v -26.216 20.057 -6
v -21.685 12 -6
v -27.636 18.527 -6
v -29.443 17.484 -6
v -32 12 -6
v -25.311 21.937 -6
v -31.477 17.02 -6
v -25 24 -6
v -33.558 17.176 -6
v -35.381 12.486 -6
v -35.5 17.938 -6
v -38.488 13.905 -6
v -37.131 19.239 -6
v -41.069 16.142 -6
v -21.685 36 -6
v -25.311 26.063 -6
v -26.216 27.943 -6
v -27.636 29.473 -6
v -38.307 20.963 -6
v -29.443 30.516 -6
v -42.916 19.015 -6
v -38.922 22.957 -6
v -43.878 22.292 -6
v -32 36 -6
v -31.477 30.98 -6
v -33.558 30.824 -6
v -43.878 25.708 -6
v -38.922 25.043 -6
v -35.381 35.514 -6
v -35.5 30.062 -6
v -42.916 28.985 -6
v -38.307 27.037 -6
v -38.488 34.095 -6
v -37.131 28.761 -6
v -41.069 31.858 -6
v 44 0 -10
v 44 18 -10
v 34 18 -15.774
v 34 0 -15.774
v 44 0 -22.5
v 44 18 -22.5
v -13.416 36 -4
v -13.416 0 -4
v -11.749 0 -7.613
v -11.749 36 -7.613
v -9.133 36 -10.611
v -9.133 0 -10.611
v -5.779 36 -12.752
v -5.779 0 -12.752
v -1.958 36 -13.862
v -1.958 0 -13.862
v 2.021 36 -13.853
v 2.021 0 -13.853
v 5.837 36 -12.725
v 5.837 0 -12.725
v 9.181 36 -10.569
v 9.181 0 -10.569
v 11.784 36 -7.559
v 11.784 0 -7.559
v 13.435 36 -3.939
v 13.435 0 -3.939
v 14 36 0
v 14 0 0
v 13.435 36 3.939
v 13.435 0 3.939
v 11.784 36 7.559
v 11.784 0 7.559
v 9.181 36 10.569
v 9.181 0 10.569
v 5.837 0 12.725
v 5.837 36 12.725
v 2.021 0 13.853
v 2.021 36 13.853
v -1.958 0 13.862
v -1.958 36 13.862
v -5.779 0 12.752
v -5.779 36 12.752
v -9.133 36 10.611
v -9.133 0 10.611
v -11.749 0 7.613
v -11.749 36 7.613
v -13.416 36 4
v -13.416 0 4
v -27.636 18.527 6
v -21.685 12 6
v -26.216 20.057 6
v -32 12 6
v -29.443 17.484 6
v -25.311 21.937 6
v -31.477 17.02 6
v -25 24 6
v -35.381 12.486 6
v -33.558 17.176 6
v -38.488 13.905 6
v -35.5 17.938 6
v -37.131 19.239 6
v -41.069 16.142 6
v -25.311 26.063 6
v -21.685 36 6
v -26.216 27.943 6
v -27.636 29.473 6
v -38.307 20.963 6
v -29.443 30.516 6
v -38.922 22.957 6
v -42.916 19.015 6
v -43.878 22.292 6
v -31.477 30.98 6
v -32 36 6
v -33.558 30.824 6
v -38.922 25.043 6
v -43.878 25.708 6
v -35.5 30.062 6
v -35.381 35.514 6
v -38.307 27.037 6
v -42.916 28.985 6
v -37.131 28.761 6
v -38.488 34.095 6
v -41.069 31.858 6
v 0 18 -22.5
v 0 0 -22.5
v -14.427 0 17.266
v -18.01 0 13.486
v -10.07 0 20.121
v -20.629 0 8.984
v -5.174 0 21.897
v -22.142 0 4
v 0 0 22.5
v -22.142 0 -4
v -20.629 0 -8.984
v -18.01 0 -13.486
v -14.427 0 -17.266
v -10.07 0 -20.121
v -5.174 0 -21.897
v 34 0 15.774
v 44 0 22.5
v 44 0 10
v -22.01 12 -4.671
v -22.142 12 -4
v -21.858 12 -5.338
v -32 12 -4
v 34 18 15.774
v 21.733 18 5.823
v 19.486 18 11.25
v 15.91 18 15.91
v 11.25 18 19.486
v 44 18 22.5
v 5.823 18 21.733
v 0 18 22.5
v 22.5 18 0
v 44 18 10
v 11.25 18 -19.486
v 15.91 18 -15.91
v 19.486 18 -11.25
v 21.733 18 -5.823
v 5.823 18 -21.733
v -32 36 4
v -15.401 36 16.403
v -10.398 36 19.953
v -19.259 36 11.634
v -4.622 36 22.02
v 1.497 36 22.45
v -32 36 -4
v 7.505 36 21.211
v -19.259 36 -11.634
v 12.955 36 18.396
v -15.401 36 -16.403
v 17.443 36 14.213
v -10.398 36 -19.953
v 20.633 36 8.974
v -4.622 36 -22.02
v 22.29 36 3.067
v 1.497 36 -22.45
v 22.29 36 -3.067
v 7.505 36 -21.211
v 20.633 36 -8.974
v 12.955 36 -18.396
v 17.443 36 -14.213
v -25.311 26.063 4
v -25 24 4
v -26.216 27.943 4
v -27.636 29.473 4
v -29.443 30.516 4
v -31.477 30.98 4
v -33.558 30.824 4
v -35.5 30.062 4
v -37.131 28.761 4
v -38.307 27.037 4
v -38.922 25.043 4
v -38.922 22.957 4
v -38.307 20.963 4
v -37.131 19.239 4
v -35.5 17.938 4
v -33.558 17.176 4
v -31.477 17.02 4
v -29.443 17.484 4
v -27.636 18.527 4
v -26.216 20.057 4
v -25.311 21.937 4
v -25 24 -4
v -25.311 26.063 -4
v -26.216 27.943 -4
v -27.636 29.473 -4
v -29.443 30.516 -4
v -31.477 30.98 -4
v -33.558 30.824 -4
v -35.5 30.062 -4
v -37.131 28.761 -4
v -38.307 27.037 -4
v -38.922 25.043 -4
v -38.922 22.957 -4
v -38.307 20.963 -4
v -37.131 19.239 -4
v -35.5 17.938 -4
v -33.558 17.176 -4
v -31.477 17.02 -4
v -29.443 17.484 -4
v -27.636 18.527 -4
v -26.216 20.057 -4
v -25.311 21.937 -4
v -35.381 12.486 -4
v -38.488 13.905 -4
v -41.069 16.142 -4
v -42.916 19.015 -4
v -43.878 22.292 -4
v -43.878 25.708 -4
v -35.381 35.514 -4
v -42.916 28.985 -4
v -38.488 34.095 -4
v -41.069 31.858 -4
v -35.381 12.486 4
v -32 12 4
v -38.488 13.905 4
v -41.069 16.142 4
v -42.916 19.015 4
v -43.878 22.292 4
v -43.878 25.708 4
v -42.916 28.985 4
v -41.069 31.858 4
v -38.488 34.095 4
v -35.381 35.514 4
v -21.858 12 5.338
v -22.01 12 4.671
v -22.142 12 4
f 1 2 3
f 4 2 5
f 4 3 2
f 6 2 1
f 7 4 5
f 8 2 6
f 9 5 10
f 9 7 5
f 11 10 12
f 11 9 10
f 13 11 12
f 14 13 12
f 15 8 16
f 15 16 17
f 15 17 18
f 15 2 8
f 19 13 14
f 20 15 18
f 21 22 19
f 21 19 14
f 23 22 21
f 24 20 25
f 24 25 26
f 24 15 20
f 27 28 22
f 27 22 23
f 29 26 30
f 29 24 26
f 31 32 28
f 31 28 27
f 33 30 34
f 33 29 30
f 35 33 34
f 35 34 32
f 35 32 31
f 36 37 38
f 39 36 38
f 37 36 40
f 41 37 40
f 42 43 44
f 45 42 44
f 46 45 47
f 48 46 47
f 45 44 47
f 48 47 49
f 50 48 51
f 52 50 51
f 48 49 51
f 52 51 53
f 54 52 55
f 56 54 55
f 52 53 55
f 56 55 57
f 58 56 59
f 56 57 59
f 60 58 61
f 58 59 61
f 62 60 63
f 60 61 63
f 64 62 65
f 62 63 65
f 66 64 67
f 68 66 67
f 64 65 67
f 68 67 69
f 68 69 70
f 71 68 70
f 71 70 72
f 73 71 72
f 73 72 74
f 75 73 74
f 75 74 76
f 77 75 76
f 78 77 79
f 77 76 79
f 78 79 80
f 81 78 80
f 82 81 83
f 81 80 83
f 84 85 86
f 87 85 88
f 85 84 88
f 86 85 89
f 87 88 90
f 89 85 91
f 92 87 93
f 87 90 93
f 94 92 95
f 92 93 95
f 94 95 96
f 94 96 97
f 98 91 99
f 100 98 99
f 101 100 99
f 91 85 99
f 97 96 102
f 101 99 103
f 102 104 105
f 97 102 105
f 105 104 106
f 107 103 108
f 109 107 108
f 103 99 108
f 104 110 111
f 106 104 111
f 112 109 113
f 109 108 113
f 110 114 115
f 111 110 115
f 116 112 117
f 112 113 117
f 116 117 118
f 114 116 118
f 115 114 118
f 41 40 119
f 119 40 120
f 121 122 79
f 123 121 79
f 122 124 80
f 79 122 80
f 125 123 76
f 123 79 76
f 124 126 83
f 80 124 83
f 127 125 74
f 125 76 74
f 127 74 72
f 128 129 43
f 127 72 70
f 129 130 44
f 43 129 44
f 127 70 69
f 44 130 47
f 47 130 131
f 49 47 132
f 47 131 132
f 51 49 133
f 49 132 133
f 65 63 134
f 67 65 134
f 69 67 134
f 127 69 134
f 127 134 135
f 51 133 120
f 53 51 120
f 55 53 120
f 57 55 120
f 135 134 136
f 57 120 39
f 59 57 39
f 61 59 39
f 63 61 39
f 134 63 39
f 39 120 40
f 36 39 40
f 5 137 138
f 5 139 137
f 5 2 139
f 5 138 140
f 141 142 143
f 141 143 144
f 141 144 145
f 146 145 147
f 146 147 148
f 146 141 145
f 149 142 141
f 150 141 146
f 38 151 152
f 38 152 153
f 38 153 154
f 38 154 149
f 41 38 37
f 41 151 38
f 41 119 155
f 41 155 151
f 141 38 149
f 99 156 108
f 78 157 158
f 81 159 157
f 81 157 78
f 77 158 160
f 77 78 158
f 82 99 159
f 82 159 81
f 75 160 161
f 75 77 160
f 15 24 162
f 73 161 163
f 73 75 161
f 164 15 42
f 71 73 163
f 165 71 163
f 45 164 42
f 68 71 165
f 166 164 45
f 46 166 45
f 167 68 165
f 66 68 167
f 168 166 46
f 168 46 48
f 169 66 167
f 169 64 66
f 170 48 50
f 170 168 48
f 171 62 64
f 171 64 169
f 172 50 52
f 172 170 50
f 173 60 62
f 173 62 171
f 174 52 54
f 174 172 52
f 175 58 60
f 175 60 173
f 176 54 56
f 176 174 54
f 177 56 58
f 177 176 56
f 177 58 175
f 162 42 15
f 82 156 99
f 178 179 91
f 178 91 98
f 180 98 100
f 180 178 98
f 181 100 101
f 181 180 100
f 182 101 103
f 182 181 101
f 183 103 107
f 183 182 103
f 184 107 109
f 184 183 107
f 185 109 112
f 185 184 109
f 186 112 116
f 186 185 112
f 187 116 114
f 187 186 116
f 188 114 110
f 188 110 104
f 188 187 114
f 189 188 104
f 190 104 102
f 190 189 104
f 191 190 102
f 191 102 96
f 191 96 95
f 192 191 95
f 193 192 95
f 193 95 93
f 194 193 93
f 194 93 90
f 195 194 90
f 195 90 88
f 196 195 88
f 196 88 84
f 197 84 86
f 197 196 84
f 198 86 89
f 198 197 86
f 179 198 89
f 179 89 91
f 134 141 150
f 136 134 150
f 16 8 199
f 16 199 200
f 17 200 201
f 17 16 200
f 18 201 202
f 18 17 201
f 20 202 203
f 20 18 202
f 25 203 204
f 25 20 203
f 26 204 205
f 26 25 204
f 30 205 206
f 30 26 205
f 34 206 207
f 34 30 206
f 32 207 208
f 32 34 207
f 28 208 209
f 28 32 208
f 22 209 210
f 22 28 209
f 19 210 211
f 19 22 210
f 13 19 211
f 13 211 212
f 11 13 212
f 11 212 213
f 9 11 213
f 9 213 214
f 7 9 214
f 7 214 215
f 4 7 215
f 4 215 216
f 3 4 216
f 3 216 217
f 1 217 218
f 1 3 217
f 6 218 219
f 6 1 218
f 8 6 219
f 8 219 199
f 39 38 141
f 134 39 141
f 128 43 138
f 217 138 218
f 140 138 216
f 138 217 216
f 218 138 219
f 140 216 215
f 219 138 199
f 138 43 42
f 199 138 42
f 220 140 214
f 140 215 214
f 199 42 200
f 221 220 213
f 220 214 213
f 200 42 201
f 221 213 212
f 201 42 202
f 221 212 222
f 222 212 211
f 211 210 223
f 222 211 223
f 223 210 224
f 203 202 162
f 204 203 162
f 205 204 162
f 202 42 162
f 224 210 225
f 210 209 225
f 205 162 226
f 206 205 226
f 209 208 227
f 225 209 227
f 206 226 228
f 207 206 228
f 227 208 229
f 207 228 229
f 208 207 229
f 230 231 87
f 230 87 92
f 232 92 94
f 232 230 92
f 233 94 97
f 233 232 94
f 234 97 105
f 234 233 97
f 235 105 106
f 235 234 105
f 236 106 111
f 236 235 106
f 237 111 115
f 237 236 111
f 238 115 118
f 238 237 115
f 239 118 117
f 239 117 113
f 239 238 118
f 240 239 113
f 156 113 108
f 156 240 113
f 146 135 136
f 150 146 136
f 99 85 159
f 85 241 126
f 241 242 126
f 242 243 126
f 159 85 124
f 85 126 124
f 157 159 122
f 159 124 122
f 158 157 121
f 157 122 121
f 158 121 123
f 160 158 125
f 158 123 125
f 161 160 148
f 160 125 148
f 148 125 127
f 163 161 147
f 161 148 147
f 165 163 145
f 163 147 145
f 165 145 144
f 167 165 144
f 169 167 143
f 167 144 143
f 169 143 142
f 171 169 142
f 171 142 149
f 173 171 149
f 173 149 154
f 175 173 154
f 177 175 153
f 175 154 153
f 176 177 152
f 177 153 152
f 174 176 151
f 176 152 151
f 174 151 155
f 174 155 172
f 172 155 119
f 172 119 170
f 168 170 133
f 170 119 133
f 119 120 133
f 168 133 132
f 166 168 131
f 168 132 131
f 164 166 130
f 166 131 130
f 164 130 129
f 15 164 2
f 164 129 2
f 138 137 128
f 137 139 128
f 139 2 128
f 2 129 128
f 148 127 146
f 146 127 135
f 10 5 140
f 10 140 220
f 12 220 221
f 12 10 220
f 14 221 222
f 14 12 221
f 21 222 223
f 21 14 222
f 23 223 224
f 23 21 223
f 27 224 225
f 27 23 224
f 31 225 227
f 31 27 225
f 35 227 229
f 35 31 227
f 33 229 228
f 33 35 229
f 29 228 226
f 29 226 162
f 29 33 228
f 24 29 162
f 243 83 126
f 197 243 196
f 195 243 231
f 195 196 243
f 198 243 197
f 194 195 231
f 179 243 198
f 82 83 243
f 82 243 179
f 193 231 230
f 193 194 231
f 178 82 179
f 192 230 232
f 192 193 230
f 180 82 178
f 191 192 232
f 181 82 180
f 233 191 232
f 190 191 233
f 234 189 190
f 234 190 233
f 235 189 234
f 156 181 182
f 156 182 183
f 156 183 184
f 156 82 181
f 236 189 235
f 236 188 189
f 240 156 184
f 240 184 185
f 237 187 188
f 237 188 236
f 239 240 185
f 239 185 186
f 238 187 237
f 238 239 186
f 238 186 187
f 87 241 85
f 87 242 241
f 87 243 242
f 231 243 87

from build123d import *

# Parameters (mm, degrees)
EXTRUDE_1_DEPTH     = 36
EXTRUDE_2_DEPTH     = 18
EXTRUDE_START       = 4
SKETCH_3_R          = 7
EXTRUDE_3_DEPTH     = 2
EXTRUDE_START_2     = -6
SKETCH_3_2_R        = 7
EXTRUDE_4_DEPTH     = 2
CUT_EXTRUDE_1_DEPTH = 53.595151868


with BuildPart() as part:
    # 草图1 → 凸台-拉伸1 (new body)
    with BuildSketch(Plane(origin=(0, 0, 0), x_dir=(1, 0, 0), z_dir=(0, 1, 0))):
        with BuildLine():
            ThreePointArc((0, 22.5), (-14.426538046, 17.26629665), (-22.141589825, 4))
            Line((-22.141589825, 4), (-13.416407865, 4))
            ThreePointArc((-13.416407865, 4), (14, 0), (-13.416407865, -4))
            Line((-13.416407865, -4), (-22.141589825, -4))
            ThreePointArc((-22.141589825, -4), (-14.426538046, -17.26629665), (0, -22.5))
            ThreePointArc((0, -22.5), (22.5, 0), (0, 22.5))
        make_face()
    extrude(amount=EXTRUDE_1_DEPTH)

    # 草图1<3> → 凸台-拉伸2 (add)
    with BuildSketch(Plane(origin=(0, 0, 0), x_dir=(1, 0, 0), z_dir=(0, 1, 0))):
        with BuildLine():
            Line((44, 22.5), (0, 22.5))
            ThreePointArc((0, 22.5), (22.5, 0), (0, -22.5))
            Line((0, -22.5), (44, -22.5))
            Line((44, -22.5), (44, 22.5))
        make_face()
    extrude(amount=EXTRUDE_2_DEPTH)

    # 草图3 → 凸台-拉伸3 (add)
    with BuildSketch(Plane.XY.offset(EXTRUDE_START)):
        with BuildLine():
            Line((-32, 36), (-21.239733593, 36))
            Line((-21.239733593, 36), (-21.239733593, 12))
            Line((-21.239733593, 12), (-32, 12))
            ThreePointArc((-32, 12), (-44, 24), (-32, 36))
        make_face()
        with Locations((-32, 24)):
            Circle(SKETCH_3_R, mode=Mode.SUBTRACT)
    extrude(amount=EXTRUDE_3_DEPTH)

    # 草图3<2> → 凸台-拉伸4 (add)
    with BuildSketch(Plane.XY.offset(EXTRUDE_START_2)):
        with BuildLine():
            Line((-32, 36), (-21.239733593, 36))
            Line((-21.239733593, 36), (-21.239733593, 12))
            Line((-21.239733593, 12), (-32, 12))
            ThreePointArc((-32, 12), (-44, 24), (-32, 36))
        make_face()
        with Locations((-32, 24)):
            Circle(SKETCH_3_2_R, mode=Mode.SUBTRACT)
    extrude(amount=EXTRUDE_4_DEPTH)

    # 草图4 → 切除-拉伸1 (cut, through all)
    with BuildSketch(Plane(origin=(0, 18, 0), x_dir=(1, 0, 0), z_dir=(0, 1, 0))):
        Polygon((44, 10), (34, 15.773502692), (34, -15.773502692), (44, -10), align=None)
    extrude(amount=-CUT_EXTRUDE_1_DEPTH, mode=Mode.SUBTRACT)


solid = part.part
